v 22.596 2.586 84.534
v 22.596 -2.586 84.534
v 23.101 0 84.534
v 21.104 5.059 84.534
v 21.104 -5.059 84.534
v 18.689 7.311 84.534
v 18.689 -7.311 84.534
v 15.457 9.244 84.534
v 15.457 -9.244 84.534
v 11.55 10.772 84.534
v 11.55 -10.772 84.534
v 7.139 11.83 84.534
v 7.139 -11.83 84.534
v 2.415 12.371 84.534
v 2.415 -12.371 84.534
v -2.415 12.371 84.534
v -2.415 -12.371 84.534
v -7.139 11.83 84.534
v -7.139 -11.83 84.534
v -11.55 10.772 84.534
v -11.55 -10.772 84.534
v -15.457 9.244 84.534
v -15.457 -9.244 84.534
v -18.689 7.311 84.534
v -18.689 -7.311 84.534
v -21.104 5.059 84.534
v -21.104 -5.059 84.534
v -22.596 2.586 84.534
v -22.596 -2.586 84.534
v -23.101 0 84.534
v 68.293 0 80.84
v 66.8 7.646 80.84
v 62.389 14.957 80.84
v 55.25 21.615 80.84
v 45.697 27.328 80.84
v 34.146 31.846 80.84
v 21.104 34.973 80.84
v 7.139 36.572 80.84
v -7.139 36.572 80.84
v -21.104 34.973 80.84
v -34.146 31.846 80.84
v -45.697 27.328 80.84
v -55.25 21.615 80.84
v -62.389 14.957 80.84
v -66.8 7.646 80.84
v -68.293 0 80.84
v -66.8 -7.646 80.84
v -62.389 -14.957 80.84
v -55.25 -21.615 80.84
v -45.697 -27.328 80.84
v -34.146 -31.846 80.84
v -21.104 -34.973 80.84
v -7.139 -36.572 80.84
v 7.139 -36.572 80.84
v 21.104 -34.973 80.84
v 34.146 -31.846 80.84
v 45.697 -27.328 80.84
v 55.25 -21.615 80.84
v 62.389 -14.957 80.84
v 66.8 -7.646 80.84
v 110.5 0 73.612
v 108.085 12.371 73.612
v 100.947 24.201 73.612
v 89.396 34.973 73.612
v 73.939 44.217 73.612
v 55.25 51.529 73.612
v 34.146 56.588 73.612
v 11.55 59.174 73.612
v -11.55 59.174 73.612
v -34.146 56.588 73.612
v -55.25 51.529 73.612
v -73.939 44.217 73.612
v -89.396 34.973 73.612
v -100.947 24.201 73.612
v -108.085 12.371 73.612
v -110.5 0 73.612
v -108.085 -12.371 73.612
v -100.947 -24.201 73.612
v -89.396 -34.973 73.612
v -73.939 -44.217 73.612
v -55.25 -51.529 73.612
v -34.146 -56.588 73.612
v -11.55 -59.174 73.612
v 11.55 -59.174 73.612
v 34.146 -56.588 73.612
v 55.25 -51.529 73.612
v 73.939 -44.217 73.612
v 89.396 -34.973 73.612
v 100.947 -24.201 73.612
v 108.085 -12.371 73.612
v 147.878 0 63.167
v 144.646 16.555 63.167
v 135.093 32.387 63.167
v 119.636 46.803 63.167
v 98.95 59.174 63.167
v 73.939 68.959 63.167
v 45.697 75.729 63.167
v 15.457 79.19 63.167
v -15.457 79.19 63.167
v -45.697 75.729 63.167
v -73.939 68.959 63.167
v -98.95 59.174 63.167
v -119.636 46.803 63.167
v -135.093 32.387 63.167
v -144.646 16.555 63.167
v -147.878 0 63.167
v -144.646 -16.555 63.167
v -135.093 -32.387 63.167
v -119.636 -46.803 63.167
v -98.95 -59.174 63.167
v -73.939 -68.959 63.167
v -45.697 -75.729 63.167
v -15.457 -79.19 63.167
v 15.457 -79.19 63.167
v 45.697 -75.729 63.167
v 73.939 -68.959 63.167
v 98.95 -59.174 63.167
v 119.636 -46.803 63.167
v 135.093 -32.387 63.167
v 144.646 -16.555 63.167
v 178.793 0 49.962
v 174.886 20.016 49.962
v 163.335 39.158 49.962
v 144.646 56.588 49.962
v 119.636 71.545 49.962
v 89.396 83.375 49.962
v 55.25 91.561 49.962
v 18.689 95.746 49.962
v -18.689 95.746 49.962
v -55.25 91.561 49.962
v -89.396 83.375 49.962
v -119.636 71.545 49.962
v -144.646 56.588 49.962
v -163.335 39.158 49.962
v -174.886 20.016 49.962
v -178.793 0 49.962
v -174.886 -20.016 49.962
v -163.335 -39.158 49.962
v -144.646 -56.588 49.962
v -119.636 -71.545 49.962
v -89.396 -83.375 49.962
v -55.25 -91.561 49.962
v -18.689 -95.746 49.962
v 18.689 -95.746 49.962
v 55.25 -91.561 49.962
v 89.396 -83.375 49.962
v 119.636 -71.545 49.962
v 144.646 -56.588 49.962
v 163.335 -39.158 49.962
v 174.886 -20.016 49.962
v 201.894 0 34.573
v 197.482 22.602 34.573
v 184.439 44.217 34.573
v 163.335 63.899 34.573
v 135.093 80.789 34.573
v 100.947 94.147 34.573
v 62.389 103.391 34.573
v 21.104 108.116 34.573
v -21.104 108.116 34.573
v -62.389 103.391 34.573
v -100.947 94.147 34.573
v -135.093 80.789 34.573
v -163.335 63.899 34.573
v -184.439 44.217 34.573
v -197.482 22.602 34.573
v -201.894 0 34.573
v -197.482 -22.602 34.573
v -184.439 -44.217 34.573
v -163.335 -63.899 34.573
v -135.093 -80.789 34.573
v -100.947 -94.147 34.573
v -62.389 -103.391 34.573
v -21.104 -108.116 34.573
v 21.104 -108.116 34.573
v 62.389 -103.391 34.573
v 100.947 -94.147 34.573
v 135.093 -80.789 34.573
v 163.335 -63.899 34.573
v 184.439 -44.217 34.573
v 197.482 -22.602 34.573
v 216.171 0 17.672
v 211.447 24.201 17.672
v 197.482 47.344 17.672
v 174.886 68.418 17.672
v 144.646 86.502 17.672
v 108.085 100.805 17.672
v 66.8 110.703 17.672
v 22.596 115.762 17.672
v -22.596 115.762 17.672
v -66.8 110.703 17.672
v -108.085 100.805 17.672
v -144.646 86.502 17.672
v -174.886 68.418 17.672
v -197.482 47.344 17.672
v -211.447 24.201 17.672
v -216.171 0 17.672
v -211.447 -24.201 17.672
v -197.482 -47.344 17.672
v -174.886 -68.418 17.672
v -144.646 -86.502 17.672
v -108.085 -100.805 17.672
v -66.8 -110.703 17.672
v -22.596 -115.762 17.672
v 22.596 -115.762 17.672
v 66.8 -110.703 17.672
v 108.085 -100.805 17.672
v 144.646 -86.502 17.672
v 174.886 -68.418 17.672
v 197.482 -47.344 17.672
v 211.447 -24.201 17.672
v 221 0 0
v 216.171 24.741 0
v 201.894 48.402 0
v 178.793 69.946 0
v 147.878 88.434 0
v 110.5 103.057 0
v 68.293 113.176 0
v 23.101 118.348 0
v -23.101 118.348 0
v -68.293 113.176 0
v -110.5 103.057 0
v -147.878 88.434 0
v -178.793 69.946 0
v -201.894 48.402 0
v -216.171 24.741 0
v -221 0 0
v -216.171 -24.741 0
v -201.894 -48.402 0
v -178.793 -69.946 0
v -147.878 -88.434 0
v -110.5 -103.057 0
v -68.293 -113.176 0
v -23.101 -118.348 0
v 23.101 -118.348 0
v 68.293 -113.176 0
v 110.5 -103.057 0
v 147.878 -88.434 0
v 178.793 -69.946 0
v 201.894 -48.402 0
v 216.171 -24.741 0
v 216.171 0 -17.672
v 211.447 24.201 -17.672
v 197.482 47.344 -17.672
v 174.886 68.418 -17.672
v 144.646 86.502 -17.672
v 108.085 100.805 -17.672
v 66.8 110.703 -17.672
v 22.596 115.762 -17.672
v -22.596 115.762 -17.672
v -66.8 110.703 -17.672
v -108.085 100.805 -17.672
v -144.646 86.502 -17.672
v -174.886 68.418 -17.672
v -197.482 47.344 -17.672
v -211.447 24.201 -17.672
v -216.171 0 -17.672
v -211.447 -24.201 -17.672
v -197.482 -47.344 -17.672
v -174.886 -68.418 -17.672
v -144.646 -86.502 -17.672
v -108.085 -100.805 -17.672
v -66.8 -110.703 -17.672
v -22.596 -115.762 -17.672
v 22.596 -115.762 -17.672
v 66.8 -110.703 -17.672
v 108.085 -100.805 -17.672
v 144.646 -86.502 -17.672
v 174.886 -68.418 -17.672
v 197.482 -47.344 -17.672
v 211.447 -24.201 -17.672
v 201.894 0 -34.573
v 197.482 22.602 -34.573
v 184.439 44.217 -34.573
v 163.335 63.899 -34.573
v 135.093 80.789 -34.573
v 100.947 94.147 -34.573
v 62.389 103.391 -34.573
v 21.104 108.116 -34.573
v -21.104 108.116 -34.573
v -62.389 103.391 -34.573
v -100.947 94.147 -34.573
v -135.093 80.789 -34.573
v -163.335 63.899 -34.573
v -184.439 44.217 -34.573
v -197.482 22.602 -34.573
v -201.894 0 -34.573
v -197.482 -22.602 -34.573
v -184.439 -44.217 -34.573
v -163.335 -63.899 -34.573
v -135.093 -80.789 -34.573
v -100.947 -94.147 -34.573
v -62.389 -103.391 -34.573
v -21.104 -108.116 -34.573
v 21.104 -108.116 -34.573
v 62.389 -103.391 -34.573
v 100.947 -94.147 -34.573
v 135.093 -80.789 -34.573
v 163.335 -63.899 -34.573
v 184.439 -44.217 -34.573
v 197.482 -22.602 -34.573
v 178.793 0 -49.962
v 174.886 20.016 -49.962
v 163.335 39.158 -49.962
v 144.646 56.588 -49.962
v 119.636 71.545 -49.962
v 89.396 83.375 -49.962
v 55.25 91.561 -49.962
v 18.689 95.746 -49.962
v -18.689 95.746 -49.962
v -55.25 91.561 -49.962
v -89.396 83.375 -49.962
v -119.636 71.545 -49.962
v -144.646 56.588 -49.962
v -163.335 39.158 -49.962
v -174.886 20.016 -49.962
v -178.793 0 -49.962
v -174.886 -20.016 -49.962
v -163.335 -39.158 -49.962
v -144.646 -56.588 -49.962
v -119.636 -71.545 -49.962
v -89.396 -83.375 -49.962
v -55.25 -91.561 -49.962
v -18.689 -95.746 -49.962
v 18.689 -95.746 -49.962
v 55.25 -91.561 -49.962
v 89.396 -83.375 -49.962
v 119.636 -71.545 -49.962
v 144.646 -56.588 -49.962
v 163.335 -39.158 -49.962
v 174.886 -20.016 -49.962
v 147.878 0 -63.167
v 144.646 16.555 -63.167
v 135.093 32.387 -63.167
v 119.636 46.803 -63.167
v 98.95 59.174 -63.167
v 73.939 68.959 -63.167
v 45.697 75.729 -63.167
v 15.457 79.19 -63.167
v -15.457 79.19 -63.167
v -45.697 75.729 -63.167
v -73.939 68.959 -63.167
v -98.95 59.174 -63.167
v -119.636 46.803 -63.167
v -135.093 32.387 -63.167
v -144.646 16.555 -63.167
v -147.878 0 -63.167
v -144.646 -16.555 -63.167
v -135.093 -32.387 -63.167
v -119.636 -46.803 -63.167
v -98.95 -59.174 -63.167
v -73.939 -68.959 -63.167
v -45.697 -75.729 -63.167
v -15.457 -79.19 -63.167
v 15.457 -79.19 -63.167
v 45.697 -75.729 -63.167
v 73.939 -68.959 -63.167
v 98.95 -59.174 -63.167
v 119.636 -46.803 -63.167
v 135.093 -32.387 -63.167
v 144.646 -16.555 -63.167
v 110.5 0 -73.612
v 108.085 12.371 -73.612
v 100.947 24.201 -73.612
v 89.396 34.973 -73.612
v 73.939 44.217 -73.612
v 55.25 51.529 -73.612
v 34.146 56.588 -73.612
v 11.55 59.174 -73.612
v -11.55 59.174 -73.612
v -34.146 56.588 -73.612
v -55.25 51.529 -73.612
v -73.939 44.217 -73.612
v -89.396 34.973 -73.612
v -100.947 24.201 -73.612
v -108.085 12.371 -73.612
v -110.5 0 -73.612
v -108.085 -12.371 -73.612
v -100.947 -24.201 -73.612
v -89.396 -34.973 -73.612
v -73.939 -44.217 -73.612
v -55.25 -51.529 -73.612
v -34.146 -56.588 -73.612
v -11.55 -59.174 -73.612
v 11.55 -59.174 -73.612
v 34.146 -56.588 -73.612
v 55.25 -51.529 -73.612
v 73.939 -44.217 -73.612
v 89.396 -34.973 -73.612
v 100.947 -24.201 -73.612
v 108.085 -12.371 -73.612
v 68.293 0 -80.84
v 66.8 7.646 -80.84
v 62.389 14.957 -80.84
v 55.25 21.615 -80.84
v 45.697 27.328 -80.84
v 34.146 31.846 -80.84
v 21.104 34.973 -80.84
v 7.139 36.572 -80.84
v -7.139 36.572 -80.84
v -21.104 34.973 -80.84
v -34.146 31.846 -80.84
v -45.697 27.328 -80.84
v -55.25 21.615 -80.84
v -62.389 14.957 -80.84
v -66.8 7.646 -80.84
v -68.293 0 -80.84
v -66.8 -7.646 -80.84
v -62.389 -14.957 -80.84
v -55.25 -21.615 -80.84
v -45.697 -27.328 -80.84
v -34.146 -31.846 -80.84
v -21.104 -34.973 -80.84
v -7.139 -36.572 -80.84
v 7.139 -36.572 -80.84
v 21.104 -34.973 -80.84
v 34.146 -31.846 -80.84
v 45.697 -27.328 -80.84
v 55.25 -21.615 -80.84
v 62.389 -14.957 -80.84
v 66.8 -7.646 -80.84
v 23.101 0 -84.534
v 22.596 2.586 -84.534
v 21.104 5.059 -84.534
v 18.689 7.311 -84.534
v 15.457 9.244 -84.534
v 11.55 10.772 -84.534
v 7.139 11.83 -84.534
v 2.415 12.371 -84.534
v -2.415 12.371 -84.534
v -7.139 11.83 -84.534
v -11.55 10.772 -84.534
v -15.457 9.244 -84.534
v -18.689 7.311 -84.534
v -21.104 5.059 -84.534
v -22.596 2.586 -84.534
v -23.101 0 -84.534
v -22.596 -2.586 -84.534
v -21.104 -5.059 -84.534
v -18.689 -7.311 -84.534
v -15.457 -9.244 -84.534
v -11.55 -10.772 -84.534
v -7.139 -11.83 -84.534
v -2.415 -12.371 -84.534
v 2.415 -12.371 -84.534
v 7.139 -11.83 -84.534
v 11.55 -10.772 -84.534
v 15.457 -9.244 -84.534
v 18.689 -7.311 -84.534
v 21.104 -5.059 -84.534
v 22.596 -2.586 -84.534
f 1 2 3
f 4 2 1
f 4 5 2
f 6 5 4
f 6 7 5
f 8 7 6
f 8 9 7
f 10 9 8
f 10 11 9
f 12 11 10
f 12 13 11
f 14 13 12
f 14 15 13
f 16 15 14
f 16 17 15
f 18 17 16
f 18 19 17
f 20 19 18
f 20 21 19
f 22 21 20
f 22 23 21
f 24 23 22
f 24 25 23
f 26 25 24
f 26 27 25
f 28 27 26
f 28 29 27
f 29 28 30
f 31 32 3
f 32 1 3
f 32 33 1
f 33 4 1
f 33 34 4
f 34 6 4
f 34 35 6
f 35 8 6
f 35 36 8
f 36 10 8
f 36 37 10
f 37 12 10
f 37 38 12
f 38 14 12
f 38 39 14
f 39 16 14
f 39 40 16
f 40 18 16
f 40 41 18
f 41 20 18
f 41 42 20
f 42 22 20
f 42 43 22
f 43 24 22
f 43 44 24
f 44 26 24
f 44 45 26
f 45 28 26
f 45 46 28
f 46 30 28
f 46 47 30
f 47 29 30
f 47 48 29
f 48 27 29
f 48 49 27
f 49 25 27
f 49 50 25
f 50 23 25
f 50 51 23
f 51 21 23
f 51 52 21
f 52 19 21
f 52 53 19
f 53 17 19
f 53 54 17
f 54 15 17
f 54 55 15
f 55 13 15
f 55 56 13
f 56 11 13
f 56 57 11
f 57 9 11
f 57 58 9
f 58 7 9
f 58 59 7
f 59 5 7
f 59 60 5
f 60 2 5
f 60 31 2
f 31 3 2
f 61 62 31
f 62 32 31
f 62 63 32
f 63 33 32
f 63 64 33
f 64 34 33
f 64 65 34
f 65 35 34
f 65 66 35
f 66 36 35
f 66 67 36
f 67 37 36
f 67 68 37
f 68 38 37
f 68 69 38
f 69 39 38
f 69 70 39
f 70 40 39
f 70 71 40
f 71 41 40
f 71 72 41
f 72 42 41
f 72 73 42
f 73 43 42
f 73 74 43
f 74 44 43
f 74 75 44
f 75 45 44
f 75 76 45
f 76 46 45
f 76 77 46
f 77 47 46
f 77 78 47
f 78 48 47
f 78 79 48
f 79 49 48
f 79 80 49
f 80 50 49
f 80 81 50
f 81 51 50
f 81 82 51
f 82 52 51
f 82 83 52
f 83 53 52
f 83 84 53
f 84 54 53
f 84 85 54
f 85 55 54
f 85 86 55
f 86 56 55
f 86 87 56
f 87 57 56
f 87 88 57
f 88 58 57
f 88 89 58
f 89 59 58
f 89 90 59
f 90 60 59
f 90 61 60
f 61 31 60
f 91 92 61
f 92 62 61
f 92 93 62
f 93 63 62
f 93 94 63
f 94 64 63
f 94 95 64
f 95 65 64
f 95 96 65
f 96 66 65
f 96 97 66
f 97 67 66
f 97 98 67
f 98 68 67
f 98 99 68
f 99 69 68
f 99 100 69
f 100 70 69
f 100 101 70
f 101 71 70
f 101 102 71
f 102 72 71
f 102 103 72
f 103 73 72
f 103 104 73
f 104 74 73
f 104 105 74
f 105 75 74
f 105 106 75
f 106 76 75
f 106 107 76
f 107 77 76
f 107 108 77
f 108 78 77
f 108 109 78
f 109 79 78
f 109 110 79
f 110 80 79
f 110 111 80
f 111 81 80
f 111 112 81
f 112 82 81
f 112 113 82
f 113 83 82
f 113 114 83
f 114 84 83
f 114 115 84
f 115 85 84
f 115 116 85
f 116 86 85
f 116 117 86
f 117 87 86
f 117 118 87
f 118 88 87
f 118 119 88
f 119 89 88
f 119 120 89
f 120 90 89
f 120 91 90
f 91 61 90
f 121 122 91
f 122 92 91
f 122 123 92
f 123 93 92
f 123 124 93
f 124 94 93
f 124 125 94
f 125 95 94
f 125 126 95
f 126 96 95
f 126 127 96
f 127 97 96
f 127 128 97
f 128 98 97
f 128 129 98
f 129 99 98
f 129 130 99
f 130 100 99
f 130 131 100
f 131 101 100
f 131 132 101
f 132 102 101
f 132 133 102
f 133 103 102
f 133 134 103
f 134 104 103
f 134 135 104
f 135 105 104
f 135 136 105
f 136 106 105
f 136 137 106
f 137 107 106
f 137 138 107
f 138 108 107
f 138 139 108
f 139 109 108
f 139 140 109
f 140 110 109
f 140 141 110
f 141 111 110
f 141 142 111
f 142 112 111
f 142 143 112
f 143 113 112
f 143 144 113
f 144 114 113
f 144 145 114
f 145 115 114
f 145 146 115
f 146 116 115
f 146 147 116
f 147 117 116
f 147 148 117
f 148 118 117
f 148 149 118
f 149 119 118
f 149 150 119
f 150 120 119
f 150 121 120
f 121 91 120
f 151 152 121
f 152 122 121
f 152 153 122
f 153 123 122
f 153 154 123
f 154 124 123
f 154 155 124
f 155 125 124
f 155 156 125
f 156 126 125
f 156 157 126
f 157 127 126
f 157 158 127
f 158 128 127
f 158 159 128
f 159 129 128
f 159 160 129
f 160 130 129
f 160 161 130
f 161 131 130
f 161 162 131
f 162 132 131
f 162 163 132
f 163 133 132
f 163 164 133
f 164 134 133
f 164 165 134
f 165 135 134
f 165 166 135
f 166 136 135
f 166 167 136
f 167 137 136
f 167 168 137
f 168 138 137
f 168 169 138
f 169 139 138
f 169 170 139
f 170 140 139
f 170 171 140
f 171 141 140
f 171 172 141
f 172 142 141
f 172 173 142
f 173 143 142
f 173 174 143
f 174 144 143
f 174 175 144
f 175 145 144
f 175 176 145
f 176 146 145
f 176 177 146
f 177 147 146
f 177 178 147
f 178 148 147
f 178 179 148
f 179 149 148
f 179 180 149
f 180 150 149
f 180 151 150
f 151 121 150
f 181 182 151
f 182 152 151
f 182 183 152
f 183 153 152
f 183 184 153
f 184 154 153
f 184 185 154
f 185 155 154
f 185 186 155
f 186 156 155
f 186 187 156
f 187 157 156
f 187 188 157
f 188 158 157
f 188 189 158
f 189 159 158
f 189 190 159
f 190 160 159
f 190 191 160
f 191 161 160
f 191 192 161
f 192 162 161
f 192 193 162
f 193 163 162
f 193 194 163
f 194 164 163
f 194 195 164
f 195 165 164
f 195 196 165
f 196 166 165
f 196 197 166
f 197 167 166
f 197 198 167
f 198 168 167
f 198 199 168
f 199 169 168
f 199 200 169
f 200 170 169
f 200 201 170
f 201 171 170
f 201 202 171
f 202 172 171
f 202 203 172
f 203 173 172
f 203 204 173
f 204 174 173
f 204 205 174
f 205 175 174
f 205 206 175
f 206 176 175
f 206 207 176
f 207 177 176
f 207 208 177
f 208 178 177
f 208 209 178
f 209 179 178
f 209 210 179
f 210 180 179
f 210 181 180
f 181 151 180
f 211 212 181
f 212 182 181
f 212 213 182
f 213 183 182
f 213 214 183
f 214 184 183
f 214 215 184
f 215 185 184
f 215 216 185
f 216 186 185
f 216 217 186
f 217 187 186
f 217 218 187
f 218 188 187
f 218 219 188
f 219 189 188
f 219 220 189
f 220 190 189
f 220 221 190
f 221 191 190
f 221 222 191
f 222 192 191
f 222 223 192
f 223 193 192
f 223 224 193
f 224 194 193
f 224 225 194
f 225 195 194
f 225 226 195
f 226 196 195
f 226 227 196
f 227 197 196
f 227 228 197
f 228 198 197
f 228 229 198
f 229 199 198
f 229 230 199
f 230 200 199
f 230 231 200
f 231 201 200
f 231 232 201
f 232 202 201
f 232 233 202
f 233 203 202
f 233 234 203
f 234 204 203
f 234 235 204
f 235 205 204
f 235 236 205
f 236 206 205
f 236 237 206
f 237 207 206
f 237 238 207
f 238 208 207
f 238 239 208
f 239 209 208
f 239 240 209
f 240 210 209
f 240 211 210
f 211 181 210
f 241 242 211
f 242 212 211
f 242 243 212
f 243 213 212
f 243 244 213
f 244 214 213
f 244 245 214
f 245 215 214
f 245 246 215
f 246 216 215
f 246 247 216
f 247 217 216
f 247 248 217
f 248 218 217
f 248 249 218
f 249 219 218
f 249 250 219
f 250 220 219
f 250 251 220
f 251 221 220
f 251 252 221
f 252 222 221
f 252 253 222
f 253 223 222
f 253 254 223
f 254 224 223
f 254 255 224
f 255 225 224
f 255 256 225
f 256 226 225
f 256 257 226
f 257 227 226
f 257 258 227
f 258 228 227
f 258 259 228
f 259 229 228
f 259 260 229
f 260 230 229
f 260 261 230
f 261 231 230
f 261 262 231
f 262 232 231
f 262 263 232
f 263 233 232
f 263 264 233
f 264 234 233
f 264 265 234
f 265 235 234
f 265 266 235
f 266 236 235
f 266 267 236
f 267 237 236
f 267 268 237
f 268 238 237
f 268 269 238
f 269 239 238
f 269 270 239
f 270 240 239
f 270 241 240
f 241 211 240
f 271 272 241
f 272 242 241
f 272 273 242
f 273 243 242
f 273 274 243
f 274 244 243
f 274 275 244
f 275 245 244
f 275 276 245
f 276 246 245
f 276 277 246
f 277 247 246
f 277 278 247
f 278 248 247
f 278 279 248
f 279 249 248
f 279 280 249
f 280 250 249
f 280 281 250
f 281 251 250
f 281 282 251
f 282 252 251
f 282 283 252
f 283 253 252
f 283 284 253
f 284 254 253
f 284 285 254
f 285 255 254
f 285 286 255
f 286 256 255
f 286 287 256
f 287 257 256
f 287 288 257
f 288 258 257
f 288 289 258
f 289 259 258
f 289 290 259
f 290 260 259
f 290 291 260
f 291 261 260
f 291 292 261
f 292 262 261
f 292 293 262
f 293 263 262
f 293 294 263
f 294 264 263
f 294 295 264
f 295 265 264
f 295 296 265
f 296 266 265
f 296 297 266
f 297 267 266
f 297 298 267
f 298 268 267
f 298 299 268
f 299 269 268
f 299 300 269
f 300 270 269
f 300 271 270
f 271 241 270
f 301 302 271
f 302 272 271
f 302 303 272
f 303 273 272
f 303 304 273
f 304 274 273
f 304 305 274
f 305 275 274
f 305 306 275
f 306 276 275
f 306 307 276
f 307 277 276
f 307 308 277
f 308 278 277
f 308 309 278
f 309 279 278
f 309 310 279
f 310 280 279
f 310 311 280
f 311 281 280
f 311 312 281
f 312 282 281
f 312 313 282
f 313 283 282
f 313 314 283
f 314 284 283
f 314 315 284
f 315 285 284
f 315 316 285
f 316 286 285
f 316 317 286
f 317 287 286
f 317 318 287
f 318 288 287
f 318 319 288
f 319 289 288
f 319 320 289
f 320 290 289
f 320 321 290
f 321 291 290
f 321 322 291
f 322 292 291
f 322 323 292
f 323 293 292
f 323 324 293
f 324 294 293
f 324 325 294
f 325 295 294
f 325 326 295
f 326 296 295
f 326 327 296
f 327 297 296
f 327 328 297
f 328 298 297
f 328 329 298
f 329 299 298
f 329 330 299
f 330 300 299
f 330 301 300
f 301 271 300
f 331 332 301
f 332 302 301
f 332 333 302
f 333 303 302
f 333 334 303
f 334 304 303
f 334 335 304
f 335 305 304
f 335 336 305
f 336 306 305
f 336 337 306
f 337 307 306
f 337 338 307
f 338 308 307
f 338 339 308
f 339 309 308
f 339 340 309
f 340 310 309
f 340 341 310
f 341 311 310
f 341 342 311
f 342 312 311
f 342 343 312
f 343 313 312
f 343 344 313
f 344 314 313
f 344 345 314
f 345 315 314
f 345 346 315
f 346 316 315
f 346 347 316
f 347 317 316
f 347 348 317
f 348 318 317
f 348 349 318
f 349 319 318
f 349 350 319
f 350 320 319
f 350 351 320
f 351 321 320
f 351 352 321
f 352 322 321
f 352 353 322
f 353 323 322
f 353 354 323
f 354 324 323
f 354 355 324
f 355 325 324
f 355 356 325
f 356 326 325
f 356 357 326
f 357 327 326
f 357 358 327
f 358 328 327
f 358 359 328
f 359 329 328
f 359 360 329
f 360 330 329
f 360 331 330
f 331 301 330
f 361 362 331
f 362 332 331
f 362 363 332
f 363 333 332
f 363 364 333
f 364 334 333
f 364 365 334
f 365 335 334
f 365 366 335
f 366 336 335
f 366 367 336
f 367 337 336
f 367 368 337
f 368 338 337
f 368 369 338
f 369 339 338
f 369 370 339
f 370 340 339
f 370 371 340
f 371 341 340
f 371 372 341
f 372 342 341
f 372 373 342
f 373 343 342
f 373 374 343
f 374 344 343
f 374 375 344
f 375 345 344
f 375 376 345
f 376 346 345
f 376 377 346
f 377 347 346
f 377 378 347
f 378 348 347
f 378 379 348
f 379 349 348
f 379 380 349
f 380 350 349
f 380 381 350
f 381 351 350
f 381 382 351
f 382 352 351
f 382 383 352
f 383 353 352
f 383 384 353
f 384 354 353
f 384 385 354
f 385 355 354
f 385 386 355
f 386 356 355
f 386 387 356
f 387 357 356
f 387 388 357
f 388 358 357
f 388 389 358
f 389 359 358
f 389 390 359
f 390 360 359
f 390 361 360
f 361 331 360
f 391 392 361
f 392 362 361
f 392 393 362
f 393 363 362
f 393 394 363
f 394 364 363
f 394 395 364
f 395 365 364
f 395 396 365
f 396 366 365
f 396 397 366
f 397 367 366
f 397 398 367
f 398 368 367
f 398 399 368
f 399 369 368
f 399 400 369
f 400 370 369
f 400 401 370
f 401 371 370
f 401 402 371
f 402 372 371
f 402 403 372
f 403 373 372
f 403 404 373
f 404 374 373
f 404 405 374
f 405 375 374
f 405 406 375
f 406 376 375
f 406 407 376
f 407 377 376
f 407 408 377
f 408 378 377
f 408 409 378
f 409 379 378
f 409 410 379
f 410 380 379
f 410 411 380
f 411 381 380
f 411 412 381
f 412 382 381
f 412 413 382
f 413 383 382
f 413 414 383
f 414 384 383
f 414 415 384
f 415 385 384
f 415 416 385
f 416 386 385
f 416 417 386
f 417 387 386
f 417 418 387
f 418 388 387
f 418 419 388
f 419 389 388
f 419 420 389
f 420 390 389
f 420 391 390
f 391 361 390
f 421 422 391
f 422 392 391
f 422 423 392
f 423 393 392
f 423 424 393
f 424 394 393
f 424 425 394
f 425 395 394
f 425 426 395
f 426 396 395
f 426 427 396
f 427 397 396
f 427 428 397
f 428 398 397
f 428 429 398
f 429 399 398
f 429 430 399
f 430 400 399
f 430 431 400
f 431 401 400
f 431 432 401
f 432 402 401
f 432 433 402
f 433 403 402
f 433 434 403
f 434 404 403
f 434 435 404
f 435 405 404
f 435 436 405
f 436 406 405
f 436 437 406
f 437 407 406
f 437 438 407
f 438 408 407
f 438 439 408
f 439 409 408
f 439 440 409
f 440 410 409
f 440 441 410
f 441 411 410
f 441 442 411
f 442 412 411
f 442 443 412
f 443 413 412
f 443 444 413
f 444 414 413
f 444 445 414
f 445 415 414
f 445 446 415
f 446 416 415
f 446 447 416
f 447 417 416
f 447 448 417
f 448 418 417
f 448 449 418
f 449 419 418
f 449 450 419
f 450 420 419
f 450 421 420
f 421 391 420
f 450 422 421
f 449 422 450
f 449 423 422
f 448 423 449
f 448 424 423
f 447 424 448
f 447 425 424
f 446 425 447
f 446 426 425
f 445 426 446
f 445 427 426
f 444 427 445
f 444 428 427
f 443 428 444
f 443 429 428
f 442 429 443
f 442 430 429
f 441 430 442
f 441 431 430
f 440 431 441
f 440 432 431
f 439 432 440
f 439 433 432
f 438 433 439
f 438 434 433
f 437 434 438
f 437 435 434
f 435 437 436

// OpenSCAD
// Generated by SolidPython 1.0.1 on 2020-07-29 00:46:50


scale(v = [13, 7, 5]) {
	sphere(r = 17);
}
/***********************************************
*********      SolidPython code:      **********
************************************************
 
# import packages: SolidPython
from solid import *
from solid.utils import *
from itertools import chain, combinations, permutations


class Resize:

    def __init__(self, scad_file):
        self.scad_file = scad_file
        #self.scad_file = import_scad(scad_file)
        # cone/cylinder param:
        self.r1 = 0
        self.r2 = 0
        self.h = 0
        # rectangular prism param:
        self.w = 0
        self.l = 0
        # ellipse param:
        self.r = 0

    # import OpenScad code (file name corresponds to shape)


    # classify shape + parameters
    def assign(self, param1, param2, param3):
        if self.scad_file == 'cone.scad':
            self.r1 = param1
            self.r2 = param2
            self.h = param3
        elif self.scad_file == 'cylinder.scad':
            self.r1 = param1
            self.r2 = param2
            self.h = param3
        elif self.scad_file == 'rectangularPrism.scad':
            self.h = param1
            self.l = param2
            self.w = param3
        else:
            self.r = param1
            self.h = param2

    # resize parameters
    def iterate(self):
        x = range(3, 20, 2)
        i = 1
        if self.scad_file == 'cone.scad':
            tempList = list(permutations(x, 2))
            for temp in tempList:
                param1 = temp[0]
                param2 = temp[1]
                filepath = 'produced_scad_files/' + 'cone' + str(param1) + '_' + str(param2) + '_' + '.scad'
                scad_render_to_file(cylinder(h=param1, r1=param2, r2=0), filepath)

        elif self.scad_file == 'cylinder.scad':
            tempList = list(permutations(x, 3))
            for temp in tempList:
                param1 = temp[0]
                param2 = temp[1]
                filepath = 'produced_scad_files/' + 'cylinder' + str(param1) + '_' + str(param2) + '_' + '.scad'
                scad_render_to_file(cylinder(h=param1, r1=param2, r2=param2), filepath)

        elif self.scad_file == 'rectangularPrism.scad':
            tempList = list(permutations(x, 3))
            for temp in tempList:
                param1 = temp[0]
                param2 = temp[1]
                param3 = temp[2]
                filepath = 'produced_scad_files/' + 'rectangularPrism' + str(param1) + '_' + str(param2) + '_' + str(
                    param3) + '.scad'
                scad_render_to_file(cube(size=(param1, param2, param3)), filepath)

        elif self.scad_file == 'ellipse.scad':
            tempList = list(permutations(x, 4))
            for temp in tempList:
                param1 = temp[0]
                param2 = temp[1]
                param3 = temp[2]
                param4 = temp[3]
                filepath = 'produced_scad_files/' + 'ellipse' + str(param1) + '_' + str(param2) + '_' + str(param3) + '_' + str(param4) + '.scad'
                scad_render_to_file(scale([param1, param2, param3])(sphere(r=param4)), filepath)

    def render_to_scadfile(self):
        scad_render_to_file(scad, 'example.scad') 
 
************************************************/
